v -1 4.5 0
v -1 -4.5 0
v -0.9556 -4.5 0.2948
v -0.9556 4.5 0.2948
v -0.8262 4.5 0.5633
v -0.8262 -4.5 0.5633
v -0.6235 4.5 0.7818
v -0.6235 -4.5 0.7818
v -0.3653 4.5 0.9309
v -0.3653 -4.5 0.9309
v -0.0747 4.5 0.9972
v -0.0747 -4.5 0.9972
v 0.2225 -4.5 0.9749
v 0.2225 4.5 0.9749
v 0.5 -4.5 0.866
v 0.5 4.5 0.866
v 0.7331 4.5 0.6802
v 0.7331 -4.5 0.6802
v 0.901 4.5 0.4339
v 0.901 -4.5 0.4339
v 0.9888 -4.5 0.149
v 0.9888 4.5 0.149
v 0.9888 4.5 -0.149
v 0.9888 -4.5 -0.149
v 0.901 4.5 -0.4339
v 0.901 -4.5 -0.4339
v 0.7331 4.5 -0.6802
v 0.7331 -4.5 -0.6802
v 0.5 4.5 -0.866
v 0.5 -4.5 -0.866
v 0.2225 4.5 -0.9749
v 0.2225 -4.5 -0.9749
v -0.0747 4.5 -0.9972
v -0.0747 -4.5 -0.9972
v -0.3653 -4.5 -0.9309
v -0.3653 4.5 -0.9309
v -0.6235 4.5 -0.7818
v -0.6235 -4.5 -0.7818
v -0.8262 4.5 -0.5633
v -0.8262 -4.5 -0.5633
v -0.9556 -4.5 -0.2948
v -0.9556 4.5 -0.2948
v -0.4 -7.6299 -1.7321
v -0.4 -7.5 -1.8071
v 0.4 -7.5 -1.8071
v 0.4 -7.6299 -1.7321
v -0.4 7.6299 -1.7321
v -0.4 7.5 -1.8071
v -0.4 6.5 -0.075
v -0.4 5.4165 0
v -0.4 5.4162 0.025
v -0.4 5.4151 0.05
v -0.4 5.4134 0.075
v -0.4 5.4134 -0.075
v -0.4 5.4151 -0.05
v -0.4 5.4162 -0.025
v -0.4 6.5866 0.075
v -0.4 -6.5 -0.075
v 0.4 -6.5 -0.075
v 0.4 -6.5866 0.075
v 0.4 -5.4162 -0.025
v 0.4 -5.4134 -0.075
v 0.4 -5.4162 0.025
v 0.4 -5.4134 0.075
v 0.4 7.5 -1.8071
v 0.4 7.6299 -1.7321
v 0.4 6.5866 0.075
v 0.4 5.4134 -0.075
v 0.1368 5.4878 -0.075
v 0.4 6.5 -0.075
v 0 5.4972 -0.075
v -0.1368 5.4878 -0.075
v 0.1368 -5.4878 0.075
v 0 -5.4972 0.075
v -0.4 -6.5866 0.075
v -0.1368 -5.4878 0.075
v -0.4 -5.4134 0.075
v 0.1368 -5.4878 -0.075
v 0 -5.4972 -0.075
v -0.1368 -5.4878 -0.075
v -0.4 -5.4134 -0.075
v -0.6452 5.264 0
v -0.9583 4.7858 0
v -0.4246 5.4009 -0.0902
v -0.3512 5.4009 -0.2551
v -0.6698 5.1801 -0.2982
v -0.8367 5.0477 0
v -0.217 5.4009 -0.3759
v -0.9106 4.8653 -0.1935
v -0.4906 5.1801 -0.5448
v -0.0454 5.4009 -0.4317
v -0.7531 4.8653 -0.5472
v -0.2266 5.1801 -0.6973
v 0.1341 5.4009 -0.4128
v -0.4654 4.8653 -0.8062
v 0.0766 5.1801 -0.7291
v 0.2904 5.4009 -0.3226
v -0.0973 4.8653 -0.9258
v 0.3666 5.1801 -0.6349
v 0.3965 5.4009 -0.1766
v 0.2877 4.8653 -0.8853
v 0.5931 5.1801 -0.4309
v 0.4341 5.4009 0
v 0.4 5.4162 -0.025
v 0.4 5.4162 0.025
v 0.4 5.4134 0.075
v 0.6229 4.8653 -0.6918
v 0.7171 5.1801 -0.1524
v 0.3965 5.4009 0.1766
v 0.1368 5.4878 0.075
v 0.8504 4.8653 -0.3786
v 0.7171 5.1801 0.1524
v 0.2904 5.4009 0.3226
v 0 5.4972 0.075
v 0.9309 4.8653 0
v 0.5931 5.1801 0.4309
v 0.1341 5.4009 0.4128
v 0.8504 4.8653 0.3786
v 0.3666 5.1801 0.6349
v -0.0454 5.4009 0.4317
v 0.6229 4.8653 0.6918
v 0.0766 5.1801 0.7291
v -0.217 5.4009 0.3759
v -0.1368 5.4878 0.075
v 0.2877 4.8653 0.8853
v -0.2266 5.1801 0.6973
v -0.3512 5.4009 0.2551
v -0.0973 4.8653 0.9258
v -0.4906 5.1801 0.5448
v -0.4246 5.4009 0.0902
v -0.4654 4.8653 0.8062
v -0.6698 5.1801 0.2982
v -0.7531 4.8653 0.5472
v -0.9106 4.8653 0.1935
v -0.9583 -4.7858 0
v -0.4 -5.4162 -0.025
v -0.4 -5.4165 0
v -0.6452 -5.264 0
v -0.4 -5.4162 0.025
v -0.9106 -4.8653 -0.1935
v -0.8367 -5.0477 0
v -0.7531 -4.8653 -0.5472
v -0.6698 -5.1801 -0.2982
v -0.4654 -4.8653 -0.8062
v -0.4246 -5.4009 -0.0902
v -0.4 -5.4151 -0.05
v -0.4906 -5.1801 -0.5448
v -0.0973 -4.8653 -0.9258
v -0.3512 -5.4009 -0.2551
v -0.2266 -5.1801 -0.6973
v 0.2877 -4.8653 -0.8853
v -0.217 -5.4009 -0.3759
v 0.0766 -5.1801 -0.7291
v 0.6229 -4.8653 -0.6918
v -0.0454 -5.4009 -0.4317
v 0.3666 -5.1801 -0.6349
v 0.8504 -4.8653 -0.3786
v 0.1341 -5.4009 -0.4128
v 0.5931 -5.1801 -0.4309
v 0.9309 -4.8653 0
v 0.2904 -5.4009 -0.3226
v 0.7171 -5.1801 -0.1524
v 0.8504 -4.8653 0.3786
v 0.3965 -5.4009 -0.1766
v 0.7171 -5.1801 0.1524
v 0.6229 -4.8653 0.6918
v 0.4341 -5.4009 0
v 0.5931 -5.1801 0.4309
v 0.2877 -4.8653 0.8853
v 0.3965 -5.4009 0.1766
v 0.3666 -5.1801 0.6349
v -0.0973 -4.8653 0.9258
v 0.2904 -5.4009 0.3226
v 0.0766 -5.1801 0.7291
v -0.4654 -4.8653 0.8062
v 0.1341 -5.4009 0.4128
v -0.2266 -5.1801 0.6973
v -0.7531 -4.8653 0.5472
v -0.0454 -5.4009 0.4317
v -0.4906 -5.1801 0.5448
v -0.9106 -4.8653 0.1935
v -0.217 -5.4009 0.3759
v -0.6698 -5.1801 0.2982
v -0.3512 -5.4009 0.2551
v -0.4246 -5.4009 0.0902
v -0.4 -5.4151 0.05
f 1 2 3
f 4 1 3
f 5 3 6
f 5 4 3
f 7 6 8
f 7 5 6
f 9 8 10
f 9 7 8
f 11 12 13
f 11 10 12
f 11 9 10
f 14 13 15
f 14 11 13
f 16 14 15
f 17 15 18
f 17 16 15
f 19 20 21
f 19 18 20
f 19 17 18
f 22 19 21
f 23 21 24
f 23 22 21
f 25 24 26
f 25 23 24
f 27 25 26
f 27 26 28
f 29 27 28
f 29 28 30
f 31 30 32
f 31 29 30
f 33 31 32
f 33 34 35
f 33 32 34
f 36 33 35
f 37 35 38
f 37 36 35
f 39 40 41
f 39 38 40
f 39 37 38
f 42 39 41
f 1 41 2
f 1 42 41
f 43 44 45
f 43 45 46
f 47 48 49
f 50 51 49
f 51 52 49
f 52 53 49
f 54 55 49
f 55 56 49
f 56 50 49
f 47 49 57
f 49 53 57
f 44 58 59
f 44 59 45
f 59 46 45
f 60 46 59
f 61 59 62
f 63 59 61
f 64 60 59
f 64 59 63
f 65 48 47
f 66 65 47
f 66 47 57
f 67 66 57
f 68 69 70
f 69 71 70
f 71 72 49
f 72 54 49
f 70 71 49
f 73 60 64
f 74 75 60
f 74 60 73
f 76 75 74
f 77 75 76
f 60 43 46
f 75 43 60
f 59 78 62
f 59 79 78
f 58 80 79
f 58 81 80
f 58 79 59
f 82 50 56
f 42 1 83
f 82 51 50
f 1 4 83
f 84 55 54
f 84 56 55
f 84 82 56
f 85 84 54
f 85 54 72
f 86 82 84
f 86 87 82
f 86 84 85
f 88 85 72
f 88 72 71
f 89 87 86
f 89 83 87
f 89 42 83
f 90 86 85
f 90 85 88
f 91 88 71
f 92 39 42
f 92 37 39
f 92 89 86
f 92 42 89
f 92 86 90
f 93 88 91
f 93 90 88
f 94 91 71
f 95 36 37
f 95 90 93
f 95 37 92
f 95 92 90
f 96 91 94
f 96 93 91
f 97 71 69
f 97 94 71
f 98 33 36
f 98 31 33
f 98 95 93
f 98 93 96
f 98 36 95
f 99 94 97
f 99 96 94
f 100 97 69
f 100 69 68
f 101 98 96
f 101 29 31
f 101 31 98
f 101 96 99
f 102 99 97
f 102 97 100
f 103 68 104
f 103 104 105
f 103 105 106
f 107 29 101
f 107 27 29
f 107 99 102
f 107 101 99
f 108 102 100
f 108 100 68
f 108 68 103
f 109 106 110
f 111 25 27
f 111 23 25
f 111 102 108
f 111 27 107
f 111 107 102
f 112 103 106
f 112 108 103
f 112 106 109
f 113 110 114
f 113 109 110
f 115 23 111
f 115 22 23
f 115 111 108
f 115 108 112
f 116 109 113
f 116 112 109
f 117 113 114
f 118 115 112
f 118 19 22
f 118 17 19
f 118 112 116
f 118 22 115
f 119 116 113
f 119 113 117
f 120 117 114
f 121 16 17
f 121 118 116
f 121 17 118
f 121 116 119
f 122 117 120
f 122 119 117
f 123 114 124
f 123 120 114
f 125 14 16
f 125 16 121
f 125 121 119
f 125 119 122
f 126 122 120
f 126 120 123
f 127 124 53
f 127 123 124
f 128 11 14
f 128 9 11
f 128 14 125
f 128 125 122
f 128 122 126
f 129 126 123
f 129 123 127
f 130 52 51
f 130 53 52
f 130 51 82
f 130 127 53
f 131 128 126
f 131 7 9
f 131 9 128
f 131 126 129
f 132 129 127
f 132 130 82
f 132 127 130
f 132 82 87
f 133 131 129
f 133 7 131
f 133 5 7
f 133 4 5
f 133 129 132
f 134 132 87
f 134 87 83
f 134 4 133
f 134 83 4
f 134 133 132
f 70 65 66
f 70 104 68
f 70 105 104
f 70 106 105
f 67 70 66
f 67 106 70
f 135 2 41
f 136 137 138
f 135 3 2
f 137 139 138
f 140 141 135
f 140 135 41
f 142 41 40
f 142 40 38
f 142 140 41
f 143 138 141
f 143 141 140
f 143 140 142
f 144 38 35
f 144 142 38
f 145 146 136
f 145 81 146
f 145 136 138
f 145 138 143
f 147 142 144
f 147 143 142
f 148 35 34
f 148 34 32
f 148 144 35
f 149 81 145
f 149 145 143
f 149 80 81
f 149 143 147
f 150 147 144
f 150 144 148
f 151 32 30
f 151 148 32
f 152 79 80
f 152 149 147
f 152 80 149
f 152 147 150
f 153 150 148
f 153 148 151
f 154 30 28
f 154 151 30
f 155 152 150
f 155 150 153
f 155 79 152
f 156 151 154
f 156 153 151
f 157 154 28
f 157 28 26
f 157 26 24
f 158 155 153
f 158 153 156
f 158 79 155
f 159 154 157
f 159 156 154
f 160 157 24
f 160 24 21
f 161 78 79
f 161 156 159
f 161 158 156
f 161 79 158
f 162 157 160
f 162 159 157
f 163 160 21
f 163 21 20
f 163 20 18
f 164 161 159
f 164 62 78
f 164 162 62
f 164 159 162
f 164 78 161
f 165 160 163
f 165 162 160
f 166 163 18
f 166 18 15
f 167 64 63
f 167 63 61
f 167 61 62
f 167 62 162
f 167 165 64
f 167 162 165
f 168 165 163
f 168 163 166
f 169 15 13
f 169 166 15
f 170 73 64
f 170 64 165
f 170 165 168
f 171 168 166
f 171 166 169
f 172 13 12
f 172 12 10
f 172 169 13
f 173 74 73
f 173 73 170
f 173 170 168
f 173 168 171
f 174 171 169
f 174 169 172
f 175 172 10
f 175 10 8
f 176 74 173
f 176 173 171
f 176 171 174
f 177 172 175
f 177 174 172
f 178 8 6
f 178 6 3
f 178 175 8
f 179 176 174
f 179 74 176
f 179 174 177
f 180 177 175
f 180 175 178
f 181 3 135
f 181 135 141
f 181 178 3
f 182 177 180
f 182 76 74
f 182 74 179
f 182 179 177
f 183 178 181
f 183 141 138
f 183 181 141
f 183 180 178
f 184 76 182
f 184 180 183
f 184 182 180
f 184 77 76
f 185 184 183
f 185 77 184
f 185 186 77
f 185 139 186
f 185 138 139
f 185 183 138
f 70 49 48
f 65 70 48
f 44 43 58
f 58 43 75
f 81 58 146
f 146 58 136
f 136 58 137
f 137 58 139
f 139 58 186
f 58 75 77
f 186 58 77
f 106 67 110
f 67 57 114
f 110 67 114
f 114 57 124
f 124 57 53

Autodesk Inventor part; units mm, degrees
ref_plane "YZ Plane" through (0, 0, 0) normal (1, 0, 0) x (0, 1, 0)
ref_plane "XZ Plane" through (0, 0, 0) normal (0, 1, 0) x (-1, 0, 0)
ref_plane "XY Plane" through (0, 0, 0) normal (0, 0, 1) x (1, 0, 0)
sketch "Sketch1" plane through (0, 0, 0) normal (0, 0, 1) x (1, 0, 0)
  line L0 (1, 4.5) -> (1, -4.5)
  line L1 (-1, -4.5) -> (-1, 4.5)
  arc A0 (1, 4.5) -> (-1, 4.5) centre (0, 4.5) ccw
  arc A1 (-1, -4.5) -> (1, -4.5) centre (0, -4.5) ccw
  line L2 (0, 5.5) -> (0, -5.5)
  point P0 (0, 0)
  point P1 (0, 0)
  dimension "d0" = 2
  dimension "d1" = 9
revolve "Revolution1" add sketch "Sketch1" angle 360 about axis through (0, 5.5, 0) along (0, -1, 0) contours L2 A1 L1 A0
sketch "Sketch3" plane through (0, 0, 0) normal (1, 0, 0) x (0, 1, 0)
  line L0 (8.5, 0.075) -> (4.5, 0.075)
  line L1 (4.5, 0.075) -> (4.5, -0.075)
  line L2 (4.5, -0.075) -> (8.5, -0.075)
  line L3 (8.5, -0.075) -> (8.5, 0.075)
  line L4 (0, 1.5086) -> (0, -1.8047) construction
  line L5 (6.5, -0.075) -> (7.5, -1.8071)
  line L6 (6.5, -0.075) -> (8.5, -0.075) construction
  line L7 (7.5, -1.8071) -> (7.6299, -1.7321)
  line L8 (7.6299, -1.7321) -> (6.5866, 0.075)
  line L9 (-8.5, 0.075) -> (-4.5, 0.075)
  line L10 (-4.5, 0.075) -> (-4.5, -0.075)
  line L11 (-4.5, -0.075) -> (-8.5, -0.075)
  line L12 (-8.5, -0.075) -> (-8.5, 0.075)
  line L13 (-6.5, -0.075) -> (-7.5, -1.8071)
  line L14 (-6.5, -0.075) -> (-8.5, -0.075) construction
  line L15 (-7.5, -1.8071) -> (-7.6299, -1.7321)
  line L16 (-7.6299, -1.7321) -> (-6.5866, 0.075)
  point P0 (0, 0)
  dimension "d7" = 4
  dimension "d8" = 0.15
  dimension "d11" = 2
  dimension "d12" = 60
  dimension "d13" = 0.15
  dimension "d14" = 4.5
extrude "Extrusion2" add sketch "Sketch3" along normal mid plane 0.8 contours L8 L2 L1 L0 | L8 L7 L5 L2 | L9 L10 L11 L16 | L11 L13 L15 L16
properties part number "LED Filament"
